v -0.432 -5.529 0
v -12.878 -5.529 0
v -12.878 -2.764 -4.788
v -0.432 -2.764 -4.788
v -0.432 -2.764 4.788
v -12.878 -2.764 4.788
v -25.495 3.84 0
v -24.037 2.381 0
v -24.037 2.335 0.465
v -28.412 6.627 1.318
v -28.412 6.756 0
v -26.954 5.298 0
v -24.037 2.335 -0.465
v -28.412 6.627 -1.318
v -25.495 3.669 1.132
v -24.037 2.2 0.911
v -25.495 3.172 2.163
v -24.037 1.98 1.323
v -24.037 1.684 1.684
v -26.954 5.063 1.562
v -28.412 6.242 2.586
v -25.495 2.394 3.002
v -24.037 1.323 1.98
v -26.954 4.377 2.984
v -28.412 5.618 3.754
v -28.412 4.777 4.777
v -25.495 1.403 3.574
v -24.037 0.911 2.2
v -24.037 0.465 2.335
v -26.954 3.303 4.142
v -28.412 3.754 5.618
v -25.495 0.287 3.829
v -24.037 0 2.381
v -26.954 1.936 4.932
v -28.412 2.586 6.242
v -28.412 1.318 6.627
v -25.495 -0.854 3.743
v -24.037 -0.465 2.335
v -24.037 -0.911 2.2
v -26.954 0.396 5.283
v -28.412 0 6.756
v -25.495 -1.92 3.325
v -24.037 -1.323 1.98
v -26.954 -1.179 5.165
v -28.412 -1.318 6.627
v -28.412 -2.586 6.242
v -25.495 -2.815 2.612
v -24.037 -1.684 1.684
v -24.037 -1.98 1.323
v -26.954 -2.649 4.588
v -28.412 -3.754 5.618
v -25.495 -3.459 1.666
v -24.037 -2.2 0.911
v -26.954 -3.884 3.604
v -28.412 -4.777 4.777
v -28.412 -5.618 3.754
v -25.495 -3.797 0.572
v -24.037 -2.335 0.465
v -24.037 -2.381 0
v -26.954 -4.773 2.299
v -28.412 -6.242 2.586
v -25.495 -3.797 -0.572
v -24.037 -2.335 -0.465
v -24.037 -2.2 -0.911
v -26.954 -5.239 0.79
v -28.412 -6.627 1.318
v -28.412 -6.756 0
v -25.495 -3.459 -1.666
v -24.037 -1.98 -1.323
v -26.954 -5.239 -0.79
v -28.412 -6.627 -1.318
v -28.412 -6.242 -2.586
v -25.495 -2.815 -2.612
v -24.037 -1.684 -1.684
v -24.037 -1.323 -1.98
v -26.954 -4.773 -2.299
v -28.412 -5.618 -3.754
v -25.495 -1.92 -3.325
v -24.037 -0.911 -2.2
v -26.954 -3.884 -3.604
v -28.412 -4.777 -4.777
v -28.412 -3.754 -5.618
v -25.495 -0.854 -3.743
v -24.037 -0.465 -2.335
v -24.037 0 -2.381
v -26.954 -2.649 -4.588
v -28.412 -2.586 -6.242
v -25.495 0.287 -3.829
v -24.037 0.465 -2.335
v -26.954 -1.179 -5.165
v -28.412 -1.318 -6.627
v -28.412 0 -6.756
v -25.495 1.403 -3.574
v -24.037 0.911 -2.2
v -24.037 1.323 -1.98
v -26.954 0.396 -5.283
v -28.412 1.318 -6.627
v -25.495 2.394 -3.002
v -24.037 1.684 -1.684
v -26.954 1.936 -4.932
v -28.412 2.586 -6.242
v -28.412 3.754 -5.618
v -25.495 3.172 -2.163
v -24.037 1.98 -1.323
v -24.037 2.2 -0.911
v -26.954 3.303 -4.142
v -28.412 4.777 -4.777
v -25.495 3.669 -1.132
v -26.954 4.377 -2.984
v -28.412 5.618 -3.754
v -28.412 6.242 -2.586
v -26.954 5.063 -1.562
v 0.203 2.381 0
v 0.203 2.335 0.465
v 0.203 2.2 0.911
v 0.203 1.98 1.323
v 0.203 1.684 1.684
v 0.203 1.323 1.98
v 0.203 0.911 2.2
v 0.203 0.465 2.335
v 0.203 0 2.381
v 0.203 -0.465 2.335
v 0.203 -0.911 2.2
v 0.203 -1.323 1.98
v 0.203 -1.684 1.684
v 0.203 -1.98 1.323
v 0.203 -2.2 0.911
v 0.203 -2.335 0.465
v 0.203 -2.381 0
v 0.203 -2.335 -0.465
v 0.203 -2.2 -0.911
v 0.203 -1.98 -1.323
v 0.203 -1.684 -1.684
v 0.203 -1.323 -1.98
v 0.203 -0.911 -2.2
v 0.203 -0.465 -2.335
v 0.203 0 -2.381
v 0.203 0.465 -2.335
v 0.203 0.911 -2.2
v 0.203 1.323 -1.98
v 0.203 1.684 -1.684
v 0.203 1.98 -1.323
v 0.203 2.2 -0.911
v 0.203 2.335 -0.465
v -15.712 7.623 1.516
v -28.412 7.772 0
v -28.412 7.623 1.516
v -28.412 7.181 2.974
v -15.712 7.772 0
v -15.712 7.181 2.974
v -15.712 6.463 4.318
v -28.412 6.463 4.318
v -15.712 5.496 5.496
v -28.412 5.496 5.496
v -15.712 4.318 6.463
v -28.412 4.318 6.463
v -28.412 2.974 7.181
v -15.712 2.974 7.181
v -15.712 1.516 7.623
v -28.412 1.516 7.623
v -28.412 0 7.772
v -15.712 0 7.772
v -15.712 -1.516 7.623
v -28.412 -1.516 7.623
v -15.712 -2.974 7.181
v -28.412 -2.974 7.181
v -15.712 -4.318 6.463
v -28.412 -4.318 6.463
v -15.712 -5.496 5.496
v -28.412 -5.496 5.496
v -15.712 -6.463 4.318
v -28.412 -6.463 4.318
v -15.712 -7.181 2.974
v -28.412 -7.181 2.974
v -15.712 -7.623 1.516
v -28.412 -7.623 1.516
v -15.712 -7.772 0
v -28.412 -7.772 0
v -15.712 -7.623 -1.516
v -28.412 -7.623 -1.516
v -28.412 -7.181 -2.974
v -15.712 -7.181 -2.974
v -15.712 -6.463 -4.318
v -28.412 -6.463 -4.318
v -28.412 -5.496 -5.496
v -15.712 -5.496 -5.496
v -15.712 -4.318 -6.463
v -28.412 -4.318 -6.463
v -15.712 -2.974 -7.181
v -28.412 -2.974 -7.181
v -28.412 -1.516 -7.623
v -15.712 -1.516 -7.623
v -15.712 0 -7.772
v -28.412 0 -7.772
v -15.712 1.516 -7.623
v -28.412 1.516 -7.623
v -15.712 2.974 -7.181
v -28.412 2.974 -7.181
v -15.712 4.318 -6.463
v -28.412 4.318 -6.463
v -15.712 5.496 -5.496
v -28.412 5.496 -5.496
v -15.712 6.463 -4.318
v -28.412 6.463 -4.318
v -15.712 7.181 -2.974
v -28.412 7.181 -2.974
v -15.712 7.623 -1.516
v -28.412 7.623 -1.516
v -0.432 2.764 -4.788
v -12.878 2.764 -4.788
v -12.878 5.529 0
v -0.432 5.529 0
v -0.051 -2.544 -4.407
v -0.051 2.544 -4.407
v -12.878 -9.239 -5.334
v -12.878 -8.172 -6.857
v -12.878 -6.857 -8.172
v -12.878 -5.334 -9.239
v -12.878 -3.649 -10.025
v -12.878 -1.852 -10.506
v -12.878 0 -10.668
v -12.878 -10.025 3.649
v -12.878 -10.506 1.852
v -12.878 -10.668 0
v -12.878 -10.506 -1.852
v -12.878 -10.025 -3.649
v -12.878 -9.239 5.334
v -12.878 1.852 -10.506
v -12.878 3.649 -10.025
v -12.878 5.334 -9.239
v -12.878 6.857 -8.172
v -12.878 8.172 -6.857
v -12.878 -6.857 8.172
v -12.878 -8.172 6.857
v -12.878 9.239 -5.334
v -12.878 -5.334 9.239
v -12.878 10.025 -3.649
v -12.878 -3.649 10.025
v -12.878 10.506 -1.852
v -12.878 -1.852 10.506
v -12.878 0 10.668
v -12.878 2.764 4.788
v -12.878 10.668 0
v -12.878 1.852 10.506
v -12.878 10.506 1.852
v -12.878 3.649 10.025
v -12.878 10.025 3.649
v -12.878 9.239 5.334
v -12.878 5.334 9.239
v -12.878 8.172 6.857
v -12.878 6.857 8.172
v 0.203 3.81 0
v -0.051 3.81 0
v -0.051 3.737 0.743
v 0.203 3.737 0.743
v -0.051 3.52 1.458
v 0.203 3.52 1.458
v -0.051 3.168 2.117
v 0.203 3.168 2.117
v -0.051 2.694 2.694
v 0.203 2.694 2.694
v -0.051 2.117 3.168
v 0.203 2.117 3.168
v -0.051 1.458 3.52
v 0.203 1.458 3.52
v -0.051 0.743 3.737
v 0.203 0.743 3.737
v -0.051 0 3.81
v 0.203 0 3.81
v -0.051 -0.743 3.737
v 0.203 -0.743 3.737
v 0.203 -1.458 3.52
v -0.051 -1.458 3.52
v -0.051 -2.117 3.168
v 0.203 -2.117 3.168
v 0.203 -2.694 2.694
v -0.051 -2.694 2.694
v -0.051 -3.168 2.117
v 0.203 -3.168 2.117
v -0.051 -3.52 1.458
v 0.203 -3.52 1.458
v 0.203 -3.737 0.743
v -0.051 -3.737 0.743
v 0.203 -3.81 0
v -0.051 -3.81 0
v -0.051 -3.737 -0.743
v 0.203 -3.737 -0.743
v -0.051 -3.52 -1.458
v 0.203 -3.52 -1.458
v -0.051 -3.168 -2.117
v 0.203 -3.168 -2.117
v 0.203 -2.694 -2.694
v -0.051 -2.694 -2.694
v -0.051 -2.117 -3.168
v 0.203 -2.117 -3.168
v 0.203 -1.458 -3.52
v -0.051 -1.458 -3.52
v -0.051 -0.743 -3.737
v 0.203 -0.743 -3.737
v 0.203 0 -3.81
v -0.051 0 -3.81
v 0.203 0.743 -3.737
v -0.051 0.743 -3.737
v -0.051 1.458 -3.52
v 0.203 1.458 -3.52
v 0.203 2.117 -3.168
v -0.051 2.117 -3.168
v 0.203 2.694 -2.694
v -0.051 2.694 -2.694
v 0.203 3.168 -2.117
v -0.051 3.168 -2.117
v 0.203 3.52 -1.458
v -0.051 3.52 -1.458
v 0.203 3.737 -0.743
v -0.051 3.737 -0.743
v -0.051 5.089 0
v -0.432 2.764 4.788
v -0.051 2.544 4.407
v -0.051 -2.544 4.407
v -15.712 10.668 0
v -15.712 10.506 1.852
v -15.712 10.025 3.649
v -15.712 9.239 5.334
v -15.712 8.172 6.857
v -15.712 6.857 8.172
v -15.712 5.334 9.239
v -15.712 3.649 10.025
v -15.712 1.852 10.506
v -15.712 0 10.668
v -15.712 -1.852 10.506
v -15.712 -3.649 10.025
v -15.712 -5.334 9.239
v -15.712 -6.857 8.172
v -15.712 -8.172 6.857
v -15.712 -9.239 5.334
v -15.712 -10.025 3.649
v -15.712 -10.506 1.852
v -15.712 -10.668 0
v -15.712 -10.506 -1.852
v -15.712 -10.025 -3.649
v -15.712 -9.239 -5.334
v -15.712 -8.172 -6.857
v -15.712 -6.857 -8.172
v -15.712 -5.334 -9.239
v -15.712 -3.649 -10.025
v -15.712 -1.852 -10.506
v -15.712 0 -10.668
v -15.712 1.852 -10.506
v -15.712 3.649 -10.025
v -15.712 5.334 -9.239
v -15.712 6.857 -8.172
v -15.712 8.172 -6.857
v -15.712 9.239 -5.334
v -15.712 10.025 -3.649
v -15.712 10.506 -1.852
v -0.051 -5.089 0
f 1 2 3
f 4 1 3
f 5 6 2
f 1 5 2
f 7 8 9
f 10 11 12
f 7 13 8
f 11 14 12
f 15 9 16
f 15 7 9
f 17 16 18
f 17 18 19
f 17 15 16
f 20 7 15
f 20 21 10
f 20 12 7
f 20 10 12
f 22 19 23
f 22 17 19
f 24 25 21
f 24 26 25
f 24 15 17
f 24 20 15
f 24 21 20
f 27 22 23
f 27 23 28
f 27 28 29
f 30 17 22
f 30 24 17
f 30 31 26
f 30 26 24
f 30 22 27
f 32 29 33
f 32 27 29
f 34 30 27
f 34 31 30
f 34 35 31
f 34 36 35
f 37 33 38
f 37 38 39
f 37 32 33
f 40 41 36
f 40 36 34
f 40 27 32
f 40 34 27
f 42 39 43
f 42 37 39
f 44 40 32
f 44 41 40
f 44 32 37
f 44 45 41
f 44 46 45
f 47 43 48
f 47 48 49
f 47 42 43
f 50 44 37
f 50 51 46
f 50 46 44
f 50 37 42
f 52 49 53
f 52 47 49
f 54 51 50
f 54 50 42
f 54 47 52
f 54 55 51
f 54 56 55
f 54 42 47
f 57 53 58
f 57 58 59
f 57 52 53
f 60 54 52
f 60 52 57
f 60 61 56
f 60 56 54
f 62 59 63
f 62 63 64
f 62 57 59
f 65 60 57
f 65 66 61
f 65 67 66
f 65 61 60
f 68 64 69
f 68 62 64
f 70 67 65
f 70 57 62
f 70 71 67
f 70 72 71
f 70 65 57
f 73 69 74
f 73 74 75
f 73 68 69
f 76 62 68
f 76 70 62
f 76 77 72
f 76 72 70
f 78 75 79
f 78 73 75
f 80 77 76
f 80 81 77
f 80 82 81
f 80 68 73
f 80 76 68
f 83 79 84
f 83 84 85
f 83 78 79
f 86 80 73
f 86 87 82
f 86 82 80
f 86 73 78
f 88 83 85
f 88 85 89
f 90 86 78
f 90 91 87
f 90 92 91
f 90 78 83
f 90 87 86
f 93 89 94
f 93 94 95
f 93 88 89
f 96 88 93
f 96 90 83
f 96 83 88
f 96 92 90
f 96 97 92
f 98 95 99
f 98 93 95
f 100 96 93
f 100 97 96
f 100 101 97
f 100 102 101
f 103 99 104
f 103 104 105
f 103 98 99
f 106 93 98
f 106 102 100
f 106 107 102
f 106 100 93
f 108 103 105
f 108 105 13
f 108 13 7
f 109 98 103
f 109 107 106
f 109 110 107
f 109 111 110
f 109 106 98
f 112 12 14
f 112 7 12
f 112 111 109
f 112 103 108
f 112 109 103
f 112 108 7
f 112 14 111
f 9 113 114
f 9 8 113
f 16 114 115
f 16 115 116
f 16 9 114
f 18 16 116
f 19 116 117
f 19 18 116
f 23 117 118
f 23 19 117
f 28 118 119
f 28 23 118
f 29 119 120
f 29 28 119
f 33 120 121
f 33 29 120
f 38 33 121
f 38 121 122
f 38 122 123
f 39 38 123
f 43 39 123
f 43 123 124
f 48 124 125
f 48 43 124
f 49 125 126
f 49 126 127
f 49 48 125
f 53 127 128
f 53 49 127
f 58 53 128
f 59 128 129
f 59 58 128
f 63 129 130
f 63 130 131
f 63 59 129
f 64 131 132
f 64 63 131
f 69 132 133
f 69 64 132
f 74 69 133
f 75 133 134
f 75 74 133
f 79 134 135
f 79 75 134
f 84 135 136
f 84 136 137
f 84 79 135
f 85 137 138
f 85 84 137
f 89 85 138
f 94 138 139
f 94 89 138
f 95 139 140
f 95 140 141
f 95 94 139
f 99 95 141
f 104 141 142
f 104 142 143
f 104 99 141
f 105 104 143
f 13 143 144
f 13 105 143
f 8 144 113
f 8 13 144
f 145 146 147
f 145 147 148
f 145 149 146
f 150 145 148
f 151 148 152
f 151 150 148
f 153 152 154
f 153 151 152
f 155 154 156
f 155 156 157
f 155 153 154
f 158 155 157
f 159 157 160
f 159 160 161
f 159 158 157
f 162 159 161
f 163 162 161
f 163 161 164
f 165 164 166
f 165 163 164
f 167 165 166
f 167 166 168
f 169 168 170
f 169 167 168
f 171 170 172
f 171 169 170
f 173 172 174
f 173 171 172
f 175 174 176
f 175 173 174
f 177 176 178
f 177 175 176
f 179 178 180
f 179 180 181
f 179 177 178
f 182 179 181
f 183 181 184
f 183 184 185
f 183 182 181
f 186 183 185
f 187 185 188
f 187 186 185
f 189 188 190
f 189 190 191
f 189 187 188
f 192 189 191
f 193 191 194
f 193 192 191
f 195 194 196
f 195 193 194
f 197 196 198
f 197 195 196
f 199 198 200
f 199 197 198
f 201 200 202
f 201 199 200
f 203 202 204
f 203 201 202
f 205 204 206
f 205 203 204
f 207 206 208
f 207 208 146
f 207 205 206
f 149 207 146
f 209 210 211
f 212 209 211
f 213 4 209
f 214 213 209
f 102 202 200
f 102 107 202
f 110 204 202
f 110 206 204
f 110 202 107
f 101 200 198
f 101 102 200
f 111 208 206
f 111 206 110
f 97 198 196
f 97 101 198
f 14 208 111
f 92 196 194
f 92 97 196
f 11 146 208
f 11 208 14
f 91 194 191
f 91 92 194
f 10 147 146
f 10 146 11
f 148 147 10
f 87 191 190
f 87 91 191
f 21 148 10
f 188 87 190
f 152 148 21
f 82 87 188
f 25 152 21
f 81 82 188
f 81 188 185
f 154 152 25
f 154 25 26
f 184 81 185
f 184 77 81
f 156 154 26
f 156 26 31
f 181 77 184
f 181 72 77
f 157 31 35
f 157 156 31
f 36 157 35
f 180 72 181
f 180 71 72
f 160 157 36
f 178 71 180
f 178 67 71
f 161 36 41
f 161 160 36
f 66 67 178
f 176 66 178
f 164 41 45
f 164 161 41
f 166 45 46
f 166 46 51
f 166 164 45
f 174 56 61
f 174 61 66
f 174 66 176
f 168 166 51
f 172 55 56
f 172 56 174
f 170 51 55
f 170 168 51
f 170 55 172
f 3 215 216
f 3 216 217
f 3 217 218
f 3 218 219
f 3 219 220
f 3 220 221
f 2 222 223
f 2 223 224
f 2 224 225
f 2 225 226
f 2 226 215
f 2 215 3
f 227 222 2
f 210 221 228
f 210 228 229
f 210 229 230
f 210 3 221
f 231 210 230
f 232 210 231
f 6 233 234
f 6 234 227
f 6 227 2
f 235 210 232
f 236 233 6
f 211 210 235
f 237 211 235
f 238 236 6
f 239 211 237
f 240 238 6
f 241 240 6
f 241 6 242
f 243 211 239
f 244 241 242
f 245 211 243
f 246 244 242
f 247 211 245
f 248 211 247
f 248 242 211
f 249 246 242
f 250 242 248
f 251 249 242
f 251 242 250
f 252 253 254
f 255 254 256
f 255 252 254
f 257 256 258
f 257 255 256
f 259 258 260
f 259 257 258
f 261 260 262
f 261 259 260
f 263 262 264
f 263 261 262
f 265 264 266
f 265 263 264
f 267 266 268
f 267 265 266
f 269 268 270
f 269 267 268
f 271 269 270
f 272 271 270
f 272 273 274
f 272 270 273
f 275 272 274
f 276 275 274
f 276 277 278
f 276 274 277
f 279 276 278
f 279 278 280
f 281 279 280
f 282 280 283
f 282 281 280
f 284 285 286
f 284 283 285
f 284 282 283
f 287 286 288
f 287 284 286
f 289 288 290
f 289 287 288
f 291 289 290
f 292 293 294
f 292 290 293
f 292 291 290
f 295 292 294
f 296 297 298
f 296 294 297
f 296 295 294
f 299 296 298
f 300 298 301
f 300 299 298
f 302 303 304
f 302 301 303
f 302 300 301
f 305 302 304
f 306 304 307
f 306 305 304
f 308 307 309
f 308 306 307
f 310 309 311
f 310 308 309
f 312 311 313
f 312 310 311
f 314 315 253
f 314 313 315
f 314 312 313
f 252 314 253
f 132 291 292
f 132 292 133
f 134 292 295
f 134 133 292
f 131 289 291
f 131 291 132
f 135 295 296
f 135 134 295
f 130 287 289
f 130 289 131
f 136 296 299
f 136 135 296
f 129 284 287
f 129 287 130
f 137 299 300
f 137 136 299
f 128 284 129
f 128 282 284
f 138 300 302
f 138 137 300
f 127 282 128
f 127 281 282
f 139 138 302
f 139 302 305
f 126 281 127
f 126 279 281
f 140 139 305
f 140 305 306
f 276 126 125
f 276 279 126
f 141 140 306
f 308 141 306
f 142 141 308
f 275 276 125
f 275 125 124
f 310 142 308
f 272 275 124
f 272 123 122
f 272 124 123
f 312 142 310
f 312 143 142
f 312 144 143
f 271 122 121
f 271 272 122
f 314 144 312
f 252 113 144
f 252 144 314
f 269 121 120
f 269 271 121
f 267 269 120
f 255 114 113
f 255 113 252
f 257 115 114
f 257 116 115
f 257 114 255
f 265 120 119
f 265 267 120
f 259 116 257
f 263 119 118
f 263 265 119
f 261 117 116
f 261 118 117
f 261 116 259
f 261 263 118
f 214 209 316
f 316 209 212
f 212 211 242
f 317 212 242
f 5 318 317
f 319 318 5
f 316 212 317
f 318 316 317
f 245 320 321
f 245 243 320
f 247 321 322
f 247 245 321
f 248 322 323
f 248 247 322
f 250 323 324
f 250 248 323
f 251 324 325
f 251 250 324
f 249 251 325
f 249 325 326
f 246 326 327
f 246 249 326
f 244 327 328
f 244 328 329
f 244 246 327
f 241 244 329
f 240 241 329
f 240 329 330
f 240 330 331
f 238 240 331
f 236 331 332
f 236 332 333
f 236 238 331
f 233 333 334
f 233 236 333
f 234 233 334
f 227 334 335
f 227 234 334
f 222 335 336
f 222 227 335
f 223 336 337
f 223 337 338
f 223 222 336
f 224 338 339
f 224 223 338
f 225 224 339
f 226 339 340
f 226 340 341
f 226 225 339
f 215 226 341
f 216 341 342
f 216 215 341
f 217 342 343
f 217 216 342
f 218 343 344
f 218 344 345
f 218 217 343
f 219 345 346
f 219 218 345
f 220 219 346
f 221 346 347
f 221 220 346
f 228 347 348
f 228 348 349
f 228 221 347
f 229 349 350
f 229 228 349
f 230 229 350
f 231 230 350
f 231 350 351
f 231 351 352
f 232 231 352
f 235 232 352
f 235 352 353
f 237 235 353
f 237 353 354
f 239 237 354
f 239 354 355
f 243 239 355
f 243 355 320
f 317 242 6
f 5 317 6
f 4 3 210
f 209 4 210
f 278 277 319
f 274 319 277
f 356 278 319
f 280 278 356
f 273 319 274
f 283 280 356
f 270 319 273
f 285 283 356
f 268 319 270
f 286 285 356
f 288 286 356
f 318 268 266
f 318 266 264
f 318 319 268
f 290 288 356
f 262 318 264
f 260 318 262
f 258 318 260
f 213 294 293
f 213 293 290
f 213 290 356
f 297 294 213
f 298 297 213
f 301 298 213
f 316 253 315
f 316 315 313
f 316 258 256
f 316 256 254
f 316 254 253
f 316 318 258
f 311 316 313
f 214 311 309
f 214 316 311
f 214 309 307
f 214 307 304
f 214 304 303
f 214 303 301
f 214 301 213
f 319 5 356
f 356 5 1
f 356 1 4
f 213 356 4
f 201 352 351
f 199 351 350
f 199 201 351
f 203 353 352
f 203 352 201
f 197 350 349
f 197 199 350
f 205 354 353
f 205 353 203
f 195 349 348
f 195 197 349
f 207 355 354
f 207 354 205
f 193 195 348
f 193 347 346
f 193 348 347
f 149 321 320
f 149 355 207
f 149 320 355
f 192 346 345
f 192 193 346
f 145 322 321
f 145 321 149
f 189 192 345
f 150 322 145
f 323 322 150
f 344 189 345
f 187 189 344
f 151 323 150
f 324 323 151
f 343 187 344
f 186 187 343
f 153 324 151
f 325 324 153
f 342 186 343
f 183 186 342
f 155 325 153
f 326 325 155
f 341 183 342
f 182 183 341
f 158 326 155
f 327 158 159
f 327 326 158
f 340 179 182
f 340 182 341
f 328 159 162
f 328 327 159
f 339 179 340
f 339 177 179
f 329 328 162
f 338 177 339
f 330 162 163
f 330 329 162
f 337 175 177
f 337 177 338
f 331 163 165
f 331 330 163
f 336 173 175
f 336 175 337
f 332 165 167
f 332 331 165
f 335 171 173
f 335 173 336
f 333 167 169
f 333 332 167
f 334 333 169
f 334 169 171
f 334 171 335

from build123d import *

# Parameters (mm, degrees)
SKETCH3_R           = 3.81
BOSS_EXTRUDE1_DEPTH = 12.827
CHAMFER1_SIZE       = 0.381


with BuildPart() as part:
    # Sketch1 → Revolve1 (revolve)
    with BuildSketch(Plane.XY):
        Polygon((-12.8778, 10.668), (-12.8778, 3.81), (0.2032, 3.81), (0.2032, 2.38125), (-24.036969082, 2.38125), (-28.412119082, 6.7564), (-28.412119082, 7.7724), (-15.712119082, 7.7724), (-15.712119082, 10.668), align=None)
    revolve(axis=Axis((-22.598839253, 0, 0), (1, 0, 0)))

    # Sketch3 → Boss-Extrude1 (add)
    with BuildSketch(Plane(origin=(-12.8778, 0, 0), x_dir=(0, 0, -1), z_dir=(1, 0, 0))):
        Polygon((-4.7879, 2.764295354), (-4.7879, -2.764295354), (0, -5.528590708), (4.7879, -2.764295354), (4.7879, 2.764295354), (0, 5.528590708), align=None)
        Circle(SKETCH3_R, mode=Mode.SUBTRACT)
    extrude(amount=BOSS_EXTRUDE1_DEPTH)

    # Chamfer1
    chamfer1_edges = [part.edges().sort_by_distance(p)[0] for p in [
        (-0.0508, 4.146443031, 2.39395),
        (-0.0508, 0, 4.7879),
        (-0.0508, -4.146443031, 2.39395),
        (-0.0508, -4.146443031, -2.39395),
        (-0.0508, 0, -4.7879),
        (-0.0508, 4.146443031, -2.39395),
    ]]
    chamfer(chamfer1_edges, length=CHAMFER1_SIZE)


solid = part.part
